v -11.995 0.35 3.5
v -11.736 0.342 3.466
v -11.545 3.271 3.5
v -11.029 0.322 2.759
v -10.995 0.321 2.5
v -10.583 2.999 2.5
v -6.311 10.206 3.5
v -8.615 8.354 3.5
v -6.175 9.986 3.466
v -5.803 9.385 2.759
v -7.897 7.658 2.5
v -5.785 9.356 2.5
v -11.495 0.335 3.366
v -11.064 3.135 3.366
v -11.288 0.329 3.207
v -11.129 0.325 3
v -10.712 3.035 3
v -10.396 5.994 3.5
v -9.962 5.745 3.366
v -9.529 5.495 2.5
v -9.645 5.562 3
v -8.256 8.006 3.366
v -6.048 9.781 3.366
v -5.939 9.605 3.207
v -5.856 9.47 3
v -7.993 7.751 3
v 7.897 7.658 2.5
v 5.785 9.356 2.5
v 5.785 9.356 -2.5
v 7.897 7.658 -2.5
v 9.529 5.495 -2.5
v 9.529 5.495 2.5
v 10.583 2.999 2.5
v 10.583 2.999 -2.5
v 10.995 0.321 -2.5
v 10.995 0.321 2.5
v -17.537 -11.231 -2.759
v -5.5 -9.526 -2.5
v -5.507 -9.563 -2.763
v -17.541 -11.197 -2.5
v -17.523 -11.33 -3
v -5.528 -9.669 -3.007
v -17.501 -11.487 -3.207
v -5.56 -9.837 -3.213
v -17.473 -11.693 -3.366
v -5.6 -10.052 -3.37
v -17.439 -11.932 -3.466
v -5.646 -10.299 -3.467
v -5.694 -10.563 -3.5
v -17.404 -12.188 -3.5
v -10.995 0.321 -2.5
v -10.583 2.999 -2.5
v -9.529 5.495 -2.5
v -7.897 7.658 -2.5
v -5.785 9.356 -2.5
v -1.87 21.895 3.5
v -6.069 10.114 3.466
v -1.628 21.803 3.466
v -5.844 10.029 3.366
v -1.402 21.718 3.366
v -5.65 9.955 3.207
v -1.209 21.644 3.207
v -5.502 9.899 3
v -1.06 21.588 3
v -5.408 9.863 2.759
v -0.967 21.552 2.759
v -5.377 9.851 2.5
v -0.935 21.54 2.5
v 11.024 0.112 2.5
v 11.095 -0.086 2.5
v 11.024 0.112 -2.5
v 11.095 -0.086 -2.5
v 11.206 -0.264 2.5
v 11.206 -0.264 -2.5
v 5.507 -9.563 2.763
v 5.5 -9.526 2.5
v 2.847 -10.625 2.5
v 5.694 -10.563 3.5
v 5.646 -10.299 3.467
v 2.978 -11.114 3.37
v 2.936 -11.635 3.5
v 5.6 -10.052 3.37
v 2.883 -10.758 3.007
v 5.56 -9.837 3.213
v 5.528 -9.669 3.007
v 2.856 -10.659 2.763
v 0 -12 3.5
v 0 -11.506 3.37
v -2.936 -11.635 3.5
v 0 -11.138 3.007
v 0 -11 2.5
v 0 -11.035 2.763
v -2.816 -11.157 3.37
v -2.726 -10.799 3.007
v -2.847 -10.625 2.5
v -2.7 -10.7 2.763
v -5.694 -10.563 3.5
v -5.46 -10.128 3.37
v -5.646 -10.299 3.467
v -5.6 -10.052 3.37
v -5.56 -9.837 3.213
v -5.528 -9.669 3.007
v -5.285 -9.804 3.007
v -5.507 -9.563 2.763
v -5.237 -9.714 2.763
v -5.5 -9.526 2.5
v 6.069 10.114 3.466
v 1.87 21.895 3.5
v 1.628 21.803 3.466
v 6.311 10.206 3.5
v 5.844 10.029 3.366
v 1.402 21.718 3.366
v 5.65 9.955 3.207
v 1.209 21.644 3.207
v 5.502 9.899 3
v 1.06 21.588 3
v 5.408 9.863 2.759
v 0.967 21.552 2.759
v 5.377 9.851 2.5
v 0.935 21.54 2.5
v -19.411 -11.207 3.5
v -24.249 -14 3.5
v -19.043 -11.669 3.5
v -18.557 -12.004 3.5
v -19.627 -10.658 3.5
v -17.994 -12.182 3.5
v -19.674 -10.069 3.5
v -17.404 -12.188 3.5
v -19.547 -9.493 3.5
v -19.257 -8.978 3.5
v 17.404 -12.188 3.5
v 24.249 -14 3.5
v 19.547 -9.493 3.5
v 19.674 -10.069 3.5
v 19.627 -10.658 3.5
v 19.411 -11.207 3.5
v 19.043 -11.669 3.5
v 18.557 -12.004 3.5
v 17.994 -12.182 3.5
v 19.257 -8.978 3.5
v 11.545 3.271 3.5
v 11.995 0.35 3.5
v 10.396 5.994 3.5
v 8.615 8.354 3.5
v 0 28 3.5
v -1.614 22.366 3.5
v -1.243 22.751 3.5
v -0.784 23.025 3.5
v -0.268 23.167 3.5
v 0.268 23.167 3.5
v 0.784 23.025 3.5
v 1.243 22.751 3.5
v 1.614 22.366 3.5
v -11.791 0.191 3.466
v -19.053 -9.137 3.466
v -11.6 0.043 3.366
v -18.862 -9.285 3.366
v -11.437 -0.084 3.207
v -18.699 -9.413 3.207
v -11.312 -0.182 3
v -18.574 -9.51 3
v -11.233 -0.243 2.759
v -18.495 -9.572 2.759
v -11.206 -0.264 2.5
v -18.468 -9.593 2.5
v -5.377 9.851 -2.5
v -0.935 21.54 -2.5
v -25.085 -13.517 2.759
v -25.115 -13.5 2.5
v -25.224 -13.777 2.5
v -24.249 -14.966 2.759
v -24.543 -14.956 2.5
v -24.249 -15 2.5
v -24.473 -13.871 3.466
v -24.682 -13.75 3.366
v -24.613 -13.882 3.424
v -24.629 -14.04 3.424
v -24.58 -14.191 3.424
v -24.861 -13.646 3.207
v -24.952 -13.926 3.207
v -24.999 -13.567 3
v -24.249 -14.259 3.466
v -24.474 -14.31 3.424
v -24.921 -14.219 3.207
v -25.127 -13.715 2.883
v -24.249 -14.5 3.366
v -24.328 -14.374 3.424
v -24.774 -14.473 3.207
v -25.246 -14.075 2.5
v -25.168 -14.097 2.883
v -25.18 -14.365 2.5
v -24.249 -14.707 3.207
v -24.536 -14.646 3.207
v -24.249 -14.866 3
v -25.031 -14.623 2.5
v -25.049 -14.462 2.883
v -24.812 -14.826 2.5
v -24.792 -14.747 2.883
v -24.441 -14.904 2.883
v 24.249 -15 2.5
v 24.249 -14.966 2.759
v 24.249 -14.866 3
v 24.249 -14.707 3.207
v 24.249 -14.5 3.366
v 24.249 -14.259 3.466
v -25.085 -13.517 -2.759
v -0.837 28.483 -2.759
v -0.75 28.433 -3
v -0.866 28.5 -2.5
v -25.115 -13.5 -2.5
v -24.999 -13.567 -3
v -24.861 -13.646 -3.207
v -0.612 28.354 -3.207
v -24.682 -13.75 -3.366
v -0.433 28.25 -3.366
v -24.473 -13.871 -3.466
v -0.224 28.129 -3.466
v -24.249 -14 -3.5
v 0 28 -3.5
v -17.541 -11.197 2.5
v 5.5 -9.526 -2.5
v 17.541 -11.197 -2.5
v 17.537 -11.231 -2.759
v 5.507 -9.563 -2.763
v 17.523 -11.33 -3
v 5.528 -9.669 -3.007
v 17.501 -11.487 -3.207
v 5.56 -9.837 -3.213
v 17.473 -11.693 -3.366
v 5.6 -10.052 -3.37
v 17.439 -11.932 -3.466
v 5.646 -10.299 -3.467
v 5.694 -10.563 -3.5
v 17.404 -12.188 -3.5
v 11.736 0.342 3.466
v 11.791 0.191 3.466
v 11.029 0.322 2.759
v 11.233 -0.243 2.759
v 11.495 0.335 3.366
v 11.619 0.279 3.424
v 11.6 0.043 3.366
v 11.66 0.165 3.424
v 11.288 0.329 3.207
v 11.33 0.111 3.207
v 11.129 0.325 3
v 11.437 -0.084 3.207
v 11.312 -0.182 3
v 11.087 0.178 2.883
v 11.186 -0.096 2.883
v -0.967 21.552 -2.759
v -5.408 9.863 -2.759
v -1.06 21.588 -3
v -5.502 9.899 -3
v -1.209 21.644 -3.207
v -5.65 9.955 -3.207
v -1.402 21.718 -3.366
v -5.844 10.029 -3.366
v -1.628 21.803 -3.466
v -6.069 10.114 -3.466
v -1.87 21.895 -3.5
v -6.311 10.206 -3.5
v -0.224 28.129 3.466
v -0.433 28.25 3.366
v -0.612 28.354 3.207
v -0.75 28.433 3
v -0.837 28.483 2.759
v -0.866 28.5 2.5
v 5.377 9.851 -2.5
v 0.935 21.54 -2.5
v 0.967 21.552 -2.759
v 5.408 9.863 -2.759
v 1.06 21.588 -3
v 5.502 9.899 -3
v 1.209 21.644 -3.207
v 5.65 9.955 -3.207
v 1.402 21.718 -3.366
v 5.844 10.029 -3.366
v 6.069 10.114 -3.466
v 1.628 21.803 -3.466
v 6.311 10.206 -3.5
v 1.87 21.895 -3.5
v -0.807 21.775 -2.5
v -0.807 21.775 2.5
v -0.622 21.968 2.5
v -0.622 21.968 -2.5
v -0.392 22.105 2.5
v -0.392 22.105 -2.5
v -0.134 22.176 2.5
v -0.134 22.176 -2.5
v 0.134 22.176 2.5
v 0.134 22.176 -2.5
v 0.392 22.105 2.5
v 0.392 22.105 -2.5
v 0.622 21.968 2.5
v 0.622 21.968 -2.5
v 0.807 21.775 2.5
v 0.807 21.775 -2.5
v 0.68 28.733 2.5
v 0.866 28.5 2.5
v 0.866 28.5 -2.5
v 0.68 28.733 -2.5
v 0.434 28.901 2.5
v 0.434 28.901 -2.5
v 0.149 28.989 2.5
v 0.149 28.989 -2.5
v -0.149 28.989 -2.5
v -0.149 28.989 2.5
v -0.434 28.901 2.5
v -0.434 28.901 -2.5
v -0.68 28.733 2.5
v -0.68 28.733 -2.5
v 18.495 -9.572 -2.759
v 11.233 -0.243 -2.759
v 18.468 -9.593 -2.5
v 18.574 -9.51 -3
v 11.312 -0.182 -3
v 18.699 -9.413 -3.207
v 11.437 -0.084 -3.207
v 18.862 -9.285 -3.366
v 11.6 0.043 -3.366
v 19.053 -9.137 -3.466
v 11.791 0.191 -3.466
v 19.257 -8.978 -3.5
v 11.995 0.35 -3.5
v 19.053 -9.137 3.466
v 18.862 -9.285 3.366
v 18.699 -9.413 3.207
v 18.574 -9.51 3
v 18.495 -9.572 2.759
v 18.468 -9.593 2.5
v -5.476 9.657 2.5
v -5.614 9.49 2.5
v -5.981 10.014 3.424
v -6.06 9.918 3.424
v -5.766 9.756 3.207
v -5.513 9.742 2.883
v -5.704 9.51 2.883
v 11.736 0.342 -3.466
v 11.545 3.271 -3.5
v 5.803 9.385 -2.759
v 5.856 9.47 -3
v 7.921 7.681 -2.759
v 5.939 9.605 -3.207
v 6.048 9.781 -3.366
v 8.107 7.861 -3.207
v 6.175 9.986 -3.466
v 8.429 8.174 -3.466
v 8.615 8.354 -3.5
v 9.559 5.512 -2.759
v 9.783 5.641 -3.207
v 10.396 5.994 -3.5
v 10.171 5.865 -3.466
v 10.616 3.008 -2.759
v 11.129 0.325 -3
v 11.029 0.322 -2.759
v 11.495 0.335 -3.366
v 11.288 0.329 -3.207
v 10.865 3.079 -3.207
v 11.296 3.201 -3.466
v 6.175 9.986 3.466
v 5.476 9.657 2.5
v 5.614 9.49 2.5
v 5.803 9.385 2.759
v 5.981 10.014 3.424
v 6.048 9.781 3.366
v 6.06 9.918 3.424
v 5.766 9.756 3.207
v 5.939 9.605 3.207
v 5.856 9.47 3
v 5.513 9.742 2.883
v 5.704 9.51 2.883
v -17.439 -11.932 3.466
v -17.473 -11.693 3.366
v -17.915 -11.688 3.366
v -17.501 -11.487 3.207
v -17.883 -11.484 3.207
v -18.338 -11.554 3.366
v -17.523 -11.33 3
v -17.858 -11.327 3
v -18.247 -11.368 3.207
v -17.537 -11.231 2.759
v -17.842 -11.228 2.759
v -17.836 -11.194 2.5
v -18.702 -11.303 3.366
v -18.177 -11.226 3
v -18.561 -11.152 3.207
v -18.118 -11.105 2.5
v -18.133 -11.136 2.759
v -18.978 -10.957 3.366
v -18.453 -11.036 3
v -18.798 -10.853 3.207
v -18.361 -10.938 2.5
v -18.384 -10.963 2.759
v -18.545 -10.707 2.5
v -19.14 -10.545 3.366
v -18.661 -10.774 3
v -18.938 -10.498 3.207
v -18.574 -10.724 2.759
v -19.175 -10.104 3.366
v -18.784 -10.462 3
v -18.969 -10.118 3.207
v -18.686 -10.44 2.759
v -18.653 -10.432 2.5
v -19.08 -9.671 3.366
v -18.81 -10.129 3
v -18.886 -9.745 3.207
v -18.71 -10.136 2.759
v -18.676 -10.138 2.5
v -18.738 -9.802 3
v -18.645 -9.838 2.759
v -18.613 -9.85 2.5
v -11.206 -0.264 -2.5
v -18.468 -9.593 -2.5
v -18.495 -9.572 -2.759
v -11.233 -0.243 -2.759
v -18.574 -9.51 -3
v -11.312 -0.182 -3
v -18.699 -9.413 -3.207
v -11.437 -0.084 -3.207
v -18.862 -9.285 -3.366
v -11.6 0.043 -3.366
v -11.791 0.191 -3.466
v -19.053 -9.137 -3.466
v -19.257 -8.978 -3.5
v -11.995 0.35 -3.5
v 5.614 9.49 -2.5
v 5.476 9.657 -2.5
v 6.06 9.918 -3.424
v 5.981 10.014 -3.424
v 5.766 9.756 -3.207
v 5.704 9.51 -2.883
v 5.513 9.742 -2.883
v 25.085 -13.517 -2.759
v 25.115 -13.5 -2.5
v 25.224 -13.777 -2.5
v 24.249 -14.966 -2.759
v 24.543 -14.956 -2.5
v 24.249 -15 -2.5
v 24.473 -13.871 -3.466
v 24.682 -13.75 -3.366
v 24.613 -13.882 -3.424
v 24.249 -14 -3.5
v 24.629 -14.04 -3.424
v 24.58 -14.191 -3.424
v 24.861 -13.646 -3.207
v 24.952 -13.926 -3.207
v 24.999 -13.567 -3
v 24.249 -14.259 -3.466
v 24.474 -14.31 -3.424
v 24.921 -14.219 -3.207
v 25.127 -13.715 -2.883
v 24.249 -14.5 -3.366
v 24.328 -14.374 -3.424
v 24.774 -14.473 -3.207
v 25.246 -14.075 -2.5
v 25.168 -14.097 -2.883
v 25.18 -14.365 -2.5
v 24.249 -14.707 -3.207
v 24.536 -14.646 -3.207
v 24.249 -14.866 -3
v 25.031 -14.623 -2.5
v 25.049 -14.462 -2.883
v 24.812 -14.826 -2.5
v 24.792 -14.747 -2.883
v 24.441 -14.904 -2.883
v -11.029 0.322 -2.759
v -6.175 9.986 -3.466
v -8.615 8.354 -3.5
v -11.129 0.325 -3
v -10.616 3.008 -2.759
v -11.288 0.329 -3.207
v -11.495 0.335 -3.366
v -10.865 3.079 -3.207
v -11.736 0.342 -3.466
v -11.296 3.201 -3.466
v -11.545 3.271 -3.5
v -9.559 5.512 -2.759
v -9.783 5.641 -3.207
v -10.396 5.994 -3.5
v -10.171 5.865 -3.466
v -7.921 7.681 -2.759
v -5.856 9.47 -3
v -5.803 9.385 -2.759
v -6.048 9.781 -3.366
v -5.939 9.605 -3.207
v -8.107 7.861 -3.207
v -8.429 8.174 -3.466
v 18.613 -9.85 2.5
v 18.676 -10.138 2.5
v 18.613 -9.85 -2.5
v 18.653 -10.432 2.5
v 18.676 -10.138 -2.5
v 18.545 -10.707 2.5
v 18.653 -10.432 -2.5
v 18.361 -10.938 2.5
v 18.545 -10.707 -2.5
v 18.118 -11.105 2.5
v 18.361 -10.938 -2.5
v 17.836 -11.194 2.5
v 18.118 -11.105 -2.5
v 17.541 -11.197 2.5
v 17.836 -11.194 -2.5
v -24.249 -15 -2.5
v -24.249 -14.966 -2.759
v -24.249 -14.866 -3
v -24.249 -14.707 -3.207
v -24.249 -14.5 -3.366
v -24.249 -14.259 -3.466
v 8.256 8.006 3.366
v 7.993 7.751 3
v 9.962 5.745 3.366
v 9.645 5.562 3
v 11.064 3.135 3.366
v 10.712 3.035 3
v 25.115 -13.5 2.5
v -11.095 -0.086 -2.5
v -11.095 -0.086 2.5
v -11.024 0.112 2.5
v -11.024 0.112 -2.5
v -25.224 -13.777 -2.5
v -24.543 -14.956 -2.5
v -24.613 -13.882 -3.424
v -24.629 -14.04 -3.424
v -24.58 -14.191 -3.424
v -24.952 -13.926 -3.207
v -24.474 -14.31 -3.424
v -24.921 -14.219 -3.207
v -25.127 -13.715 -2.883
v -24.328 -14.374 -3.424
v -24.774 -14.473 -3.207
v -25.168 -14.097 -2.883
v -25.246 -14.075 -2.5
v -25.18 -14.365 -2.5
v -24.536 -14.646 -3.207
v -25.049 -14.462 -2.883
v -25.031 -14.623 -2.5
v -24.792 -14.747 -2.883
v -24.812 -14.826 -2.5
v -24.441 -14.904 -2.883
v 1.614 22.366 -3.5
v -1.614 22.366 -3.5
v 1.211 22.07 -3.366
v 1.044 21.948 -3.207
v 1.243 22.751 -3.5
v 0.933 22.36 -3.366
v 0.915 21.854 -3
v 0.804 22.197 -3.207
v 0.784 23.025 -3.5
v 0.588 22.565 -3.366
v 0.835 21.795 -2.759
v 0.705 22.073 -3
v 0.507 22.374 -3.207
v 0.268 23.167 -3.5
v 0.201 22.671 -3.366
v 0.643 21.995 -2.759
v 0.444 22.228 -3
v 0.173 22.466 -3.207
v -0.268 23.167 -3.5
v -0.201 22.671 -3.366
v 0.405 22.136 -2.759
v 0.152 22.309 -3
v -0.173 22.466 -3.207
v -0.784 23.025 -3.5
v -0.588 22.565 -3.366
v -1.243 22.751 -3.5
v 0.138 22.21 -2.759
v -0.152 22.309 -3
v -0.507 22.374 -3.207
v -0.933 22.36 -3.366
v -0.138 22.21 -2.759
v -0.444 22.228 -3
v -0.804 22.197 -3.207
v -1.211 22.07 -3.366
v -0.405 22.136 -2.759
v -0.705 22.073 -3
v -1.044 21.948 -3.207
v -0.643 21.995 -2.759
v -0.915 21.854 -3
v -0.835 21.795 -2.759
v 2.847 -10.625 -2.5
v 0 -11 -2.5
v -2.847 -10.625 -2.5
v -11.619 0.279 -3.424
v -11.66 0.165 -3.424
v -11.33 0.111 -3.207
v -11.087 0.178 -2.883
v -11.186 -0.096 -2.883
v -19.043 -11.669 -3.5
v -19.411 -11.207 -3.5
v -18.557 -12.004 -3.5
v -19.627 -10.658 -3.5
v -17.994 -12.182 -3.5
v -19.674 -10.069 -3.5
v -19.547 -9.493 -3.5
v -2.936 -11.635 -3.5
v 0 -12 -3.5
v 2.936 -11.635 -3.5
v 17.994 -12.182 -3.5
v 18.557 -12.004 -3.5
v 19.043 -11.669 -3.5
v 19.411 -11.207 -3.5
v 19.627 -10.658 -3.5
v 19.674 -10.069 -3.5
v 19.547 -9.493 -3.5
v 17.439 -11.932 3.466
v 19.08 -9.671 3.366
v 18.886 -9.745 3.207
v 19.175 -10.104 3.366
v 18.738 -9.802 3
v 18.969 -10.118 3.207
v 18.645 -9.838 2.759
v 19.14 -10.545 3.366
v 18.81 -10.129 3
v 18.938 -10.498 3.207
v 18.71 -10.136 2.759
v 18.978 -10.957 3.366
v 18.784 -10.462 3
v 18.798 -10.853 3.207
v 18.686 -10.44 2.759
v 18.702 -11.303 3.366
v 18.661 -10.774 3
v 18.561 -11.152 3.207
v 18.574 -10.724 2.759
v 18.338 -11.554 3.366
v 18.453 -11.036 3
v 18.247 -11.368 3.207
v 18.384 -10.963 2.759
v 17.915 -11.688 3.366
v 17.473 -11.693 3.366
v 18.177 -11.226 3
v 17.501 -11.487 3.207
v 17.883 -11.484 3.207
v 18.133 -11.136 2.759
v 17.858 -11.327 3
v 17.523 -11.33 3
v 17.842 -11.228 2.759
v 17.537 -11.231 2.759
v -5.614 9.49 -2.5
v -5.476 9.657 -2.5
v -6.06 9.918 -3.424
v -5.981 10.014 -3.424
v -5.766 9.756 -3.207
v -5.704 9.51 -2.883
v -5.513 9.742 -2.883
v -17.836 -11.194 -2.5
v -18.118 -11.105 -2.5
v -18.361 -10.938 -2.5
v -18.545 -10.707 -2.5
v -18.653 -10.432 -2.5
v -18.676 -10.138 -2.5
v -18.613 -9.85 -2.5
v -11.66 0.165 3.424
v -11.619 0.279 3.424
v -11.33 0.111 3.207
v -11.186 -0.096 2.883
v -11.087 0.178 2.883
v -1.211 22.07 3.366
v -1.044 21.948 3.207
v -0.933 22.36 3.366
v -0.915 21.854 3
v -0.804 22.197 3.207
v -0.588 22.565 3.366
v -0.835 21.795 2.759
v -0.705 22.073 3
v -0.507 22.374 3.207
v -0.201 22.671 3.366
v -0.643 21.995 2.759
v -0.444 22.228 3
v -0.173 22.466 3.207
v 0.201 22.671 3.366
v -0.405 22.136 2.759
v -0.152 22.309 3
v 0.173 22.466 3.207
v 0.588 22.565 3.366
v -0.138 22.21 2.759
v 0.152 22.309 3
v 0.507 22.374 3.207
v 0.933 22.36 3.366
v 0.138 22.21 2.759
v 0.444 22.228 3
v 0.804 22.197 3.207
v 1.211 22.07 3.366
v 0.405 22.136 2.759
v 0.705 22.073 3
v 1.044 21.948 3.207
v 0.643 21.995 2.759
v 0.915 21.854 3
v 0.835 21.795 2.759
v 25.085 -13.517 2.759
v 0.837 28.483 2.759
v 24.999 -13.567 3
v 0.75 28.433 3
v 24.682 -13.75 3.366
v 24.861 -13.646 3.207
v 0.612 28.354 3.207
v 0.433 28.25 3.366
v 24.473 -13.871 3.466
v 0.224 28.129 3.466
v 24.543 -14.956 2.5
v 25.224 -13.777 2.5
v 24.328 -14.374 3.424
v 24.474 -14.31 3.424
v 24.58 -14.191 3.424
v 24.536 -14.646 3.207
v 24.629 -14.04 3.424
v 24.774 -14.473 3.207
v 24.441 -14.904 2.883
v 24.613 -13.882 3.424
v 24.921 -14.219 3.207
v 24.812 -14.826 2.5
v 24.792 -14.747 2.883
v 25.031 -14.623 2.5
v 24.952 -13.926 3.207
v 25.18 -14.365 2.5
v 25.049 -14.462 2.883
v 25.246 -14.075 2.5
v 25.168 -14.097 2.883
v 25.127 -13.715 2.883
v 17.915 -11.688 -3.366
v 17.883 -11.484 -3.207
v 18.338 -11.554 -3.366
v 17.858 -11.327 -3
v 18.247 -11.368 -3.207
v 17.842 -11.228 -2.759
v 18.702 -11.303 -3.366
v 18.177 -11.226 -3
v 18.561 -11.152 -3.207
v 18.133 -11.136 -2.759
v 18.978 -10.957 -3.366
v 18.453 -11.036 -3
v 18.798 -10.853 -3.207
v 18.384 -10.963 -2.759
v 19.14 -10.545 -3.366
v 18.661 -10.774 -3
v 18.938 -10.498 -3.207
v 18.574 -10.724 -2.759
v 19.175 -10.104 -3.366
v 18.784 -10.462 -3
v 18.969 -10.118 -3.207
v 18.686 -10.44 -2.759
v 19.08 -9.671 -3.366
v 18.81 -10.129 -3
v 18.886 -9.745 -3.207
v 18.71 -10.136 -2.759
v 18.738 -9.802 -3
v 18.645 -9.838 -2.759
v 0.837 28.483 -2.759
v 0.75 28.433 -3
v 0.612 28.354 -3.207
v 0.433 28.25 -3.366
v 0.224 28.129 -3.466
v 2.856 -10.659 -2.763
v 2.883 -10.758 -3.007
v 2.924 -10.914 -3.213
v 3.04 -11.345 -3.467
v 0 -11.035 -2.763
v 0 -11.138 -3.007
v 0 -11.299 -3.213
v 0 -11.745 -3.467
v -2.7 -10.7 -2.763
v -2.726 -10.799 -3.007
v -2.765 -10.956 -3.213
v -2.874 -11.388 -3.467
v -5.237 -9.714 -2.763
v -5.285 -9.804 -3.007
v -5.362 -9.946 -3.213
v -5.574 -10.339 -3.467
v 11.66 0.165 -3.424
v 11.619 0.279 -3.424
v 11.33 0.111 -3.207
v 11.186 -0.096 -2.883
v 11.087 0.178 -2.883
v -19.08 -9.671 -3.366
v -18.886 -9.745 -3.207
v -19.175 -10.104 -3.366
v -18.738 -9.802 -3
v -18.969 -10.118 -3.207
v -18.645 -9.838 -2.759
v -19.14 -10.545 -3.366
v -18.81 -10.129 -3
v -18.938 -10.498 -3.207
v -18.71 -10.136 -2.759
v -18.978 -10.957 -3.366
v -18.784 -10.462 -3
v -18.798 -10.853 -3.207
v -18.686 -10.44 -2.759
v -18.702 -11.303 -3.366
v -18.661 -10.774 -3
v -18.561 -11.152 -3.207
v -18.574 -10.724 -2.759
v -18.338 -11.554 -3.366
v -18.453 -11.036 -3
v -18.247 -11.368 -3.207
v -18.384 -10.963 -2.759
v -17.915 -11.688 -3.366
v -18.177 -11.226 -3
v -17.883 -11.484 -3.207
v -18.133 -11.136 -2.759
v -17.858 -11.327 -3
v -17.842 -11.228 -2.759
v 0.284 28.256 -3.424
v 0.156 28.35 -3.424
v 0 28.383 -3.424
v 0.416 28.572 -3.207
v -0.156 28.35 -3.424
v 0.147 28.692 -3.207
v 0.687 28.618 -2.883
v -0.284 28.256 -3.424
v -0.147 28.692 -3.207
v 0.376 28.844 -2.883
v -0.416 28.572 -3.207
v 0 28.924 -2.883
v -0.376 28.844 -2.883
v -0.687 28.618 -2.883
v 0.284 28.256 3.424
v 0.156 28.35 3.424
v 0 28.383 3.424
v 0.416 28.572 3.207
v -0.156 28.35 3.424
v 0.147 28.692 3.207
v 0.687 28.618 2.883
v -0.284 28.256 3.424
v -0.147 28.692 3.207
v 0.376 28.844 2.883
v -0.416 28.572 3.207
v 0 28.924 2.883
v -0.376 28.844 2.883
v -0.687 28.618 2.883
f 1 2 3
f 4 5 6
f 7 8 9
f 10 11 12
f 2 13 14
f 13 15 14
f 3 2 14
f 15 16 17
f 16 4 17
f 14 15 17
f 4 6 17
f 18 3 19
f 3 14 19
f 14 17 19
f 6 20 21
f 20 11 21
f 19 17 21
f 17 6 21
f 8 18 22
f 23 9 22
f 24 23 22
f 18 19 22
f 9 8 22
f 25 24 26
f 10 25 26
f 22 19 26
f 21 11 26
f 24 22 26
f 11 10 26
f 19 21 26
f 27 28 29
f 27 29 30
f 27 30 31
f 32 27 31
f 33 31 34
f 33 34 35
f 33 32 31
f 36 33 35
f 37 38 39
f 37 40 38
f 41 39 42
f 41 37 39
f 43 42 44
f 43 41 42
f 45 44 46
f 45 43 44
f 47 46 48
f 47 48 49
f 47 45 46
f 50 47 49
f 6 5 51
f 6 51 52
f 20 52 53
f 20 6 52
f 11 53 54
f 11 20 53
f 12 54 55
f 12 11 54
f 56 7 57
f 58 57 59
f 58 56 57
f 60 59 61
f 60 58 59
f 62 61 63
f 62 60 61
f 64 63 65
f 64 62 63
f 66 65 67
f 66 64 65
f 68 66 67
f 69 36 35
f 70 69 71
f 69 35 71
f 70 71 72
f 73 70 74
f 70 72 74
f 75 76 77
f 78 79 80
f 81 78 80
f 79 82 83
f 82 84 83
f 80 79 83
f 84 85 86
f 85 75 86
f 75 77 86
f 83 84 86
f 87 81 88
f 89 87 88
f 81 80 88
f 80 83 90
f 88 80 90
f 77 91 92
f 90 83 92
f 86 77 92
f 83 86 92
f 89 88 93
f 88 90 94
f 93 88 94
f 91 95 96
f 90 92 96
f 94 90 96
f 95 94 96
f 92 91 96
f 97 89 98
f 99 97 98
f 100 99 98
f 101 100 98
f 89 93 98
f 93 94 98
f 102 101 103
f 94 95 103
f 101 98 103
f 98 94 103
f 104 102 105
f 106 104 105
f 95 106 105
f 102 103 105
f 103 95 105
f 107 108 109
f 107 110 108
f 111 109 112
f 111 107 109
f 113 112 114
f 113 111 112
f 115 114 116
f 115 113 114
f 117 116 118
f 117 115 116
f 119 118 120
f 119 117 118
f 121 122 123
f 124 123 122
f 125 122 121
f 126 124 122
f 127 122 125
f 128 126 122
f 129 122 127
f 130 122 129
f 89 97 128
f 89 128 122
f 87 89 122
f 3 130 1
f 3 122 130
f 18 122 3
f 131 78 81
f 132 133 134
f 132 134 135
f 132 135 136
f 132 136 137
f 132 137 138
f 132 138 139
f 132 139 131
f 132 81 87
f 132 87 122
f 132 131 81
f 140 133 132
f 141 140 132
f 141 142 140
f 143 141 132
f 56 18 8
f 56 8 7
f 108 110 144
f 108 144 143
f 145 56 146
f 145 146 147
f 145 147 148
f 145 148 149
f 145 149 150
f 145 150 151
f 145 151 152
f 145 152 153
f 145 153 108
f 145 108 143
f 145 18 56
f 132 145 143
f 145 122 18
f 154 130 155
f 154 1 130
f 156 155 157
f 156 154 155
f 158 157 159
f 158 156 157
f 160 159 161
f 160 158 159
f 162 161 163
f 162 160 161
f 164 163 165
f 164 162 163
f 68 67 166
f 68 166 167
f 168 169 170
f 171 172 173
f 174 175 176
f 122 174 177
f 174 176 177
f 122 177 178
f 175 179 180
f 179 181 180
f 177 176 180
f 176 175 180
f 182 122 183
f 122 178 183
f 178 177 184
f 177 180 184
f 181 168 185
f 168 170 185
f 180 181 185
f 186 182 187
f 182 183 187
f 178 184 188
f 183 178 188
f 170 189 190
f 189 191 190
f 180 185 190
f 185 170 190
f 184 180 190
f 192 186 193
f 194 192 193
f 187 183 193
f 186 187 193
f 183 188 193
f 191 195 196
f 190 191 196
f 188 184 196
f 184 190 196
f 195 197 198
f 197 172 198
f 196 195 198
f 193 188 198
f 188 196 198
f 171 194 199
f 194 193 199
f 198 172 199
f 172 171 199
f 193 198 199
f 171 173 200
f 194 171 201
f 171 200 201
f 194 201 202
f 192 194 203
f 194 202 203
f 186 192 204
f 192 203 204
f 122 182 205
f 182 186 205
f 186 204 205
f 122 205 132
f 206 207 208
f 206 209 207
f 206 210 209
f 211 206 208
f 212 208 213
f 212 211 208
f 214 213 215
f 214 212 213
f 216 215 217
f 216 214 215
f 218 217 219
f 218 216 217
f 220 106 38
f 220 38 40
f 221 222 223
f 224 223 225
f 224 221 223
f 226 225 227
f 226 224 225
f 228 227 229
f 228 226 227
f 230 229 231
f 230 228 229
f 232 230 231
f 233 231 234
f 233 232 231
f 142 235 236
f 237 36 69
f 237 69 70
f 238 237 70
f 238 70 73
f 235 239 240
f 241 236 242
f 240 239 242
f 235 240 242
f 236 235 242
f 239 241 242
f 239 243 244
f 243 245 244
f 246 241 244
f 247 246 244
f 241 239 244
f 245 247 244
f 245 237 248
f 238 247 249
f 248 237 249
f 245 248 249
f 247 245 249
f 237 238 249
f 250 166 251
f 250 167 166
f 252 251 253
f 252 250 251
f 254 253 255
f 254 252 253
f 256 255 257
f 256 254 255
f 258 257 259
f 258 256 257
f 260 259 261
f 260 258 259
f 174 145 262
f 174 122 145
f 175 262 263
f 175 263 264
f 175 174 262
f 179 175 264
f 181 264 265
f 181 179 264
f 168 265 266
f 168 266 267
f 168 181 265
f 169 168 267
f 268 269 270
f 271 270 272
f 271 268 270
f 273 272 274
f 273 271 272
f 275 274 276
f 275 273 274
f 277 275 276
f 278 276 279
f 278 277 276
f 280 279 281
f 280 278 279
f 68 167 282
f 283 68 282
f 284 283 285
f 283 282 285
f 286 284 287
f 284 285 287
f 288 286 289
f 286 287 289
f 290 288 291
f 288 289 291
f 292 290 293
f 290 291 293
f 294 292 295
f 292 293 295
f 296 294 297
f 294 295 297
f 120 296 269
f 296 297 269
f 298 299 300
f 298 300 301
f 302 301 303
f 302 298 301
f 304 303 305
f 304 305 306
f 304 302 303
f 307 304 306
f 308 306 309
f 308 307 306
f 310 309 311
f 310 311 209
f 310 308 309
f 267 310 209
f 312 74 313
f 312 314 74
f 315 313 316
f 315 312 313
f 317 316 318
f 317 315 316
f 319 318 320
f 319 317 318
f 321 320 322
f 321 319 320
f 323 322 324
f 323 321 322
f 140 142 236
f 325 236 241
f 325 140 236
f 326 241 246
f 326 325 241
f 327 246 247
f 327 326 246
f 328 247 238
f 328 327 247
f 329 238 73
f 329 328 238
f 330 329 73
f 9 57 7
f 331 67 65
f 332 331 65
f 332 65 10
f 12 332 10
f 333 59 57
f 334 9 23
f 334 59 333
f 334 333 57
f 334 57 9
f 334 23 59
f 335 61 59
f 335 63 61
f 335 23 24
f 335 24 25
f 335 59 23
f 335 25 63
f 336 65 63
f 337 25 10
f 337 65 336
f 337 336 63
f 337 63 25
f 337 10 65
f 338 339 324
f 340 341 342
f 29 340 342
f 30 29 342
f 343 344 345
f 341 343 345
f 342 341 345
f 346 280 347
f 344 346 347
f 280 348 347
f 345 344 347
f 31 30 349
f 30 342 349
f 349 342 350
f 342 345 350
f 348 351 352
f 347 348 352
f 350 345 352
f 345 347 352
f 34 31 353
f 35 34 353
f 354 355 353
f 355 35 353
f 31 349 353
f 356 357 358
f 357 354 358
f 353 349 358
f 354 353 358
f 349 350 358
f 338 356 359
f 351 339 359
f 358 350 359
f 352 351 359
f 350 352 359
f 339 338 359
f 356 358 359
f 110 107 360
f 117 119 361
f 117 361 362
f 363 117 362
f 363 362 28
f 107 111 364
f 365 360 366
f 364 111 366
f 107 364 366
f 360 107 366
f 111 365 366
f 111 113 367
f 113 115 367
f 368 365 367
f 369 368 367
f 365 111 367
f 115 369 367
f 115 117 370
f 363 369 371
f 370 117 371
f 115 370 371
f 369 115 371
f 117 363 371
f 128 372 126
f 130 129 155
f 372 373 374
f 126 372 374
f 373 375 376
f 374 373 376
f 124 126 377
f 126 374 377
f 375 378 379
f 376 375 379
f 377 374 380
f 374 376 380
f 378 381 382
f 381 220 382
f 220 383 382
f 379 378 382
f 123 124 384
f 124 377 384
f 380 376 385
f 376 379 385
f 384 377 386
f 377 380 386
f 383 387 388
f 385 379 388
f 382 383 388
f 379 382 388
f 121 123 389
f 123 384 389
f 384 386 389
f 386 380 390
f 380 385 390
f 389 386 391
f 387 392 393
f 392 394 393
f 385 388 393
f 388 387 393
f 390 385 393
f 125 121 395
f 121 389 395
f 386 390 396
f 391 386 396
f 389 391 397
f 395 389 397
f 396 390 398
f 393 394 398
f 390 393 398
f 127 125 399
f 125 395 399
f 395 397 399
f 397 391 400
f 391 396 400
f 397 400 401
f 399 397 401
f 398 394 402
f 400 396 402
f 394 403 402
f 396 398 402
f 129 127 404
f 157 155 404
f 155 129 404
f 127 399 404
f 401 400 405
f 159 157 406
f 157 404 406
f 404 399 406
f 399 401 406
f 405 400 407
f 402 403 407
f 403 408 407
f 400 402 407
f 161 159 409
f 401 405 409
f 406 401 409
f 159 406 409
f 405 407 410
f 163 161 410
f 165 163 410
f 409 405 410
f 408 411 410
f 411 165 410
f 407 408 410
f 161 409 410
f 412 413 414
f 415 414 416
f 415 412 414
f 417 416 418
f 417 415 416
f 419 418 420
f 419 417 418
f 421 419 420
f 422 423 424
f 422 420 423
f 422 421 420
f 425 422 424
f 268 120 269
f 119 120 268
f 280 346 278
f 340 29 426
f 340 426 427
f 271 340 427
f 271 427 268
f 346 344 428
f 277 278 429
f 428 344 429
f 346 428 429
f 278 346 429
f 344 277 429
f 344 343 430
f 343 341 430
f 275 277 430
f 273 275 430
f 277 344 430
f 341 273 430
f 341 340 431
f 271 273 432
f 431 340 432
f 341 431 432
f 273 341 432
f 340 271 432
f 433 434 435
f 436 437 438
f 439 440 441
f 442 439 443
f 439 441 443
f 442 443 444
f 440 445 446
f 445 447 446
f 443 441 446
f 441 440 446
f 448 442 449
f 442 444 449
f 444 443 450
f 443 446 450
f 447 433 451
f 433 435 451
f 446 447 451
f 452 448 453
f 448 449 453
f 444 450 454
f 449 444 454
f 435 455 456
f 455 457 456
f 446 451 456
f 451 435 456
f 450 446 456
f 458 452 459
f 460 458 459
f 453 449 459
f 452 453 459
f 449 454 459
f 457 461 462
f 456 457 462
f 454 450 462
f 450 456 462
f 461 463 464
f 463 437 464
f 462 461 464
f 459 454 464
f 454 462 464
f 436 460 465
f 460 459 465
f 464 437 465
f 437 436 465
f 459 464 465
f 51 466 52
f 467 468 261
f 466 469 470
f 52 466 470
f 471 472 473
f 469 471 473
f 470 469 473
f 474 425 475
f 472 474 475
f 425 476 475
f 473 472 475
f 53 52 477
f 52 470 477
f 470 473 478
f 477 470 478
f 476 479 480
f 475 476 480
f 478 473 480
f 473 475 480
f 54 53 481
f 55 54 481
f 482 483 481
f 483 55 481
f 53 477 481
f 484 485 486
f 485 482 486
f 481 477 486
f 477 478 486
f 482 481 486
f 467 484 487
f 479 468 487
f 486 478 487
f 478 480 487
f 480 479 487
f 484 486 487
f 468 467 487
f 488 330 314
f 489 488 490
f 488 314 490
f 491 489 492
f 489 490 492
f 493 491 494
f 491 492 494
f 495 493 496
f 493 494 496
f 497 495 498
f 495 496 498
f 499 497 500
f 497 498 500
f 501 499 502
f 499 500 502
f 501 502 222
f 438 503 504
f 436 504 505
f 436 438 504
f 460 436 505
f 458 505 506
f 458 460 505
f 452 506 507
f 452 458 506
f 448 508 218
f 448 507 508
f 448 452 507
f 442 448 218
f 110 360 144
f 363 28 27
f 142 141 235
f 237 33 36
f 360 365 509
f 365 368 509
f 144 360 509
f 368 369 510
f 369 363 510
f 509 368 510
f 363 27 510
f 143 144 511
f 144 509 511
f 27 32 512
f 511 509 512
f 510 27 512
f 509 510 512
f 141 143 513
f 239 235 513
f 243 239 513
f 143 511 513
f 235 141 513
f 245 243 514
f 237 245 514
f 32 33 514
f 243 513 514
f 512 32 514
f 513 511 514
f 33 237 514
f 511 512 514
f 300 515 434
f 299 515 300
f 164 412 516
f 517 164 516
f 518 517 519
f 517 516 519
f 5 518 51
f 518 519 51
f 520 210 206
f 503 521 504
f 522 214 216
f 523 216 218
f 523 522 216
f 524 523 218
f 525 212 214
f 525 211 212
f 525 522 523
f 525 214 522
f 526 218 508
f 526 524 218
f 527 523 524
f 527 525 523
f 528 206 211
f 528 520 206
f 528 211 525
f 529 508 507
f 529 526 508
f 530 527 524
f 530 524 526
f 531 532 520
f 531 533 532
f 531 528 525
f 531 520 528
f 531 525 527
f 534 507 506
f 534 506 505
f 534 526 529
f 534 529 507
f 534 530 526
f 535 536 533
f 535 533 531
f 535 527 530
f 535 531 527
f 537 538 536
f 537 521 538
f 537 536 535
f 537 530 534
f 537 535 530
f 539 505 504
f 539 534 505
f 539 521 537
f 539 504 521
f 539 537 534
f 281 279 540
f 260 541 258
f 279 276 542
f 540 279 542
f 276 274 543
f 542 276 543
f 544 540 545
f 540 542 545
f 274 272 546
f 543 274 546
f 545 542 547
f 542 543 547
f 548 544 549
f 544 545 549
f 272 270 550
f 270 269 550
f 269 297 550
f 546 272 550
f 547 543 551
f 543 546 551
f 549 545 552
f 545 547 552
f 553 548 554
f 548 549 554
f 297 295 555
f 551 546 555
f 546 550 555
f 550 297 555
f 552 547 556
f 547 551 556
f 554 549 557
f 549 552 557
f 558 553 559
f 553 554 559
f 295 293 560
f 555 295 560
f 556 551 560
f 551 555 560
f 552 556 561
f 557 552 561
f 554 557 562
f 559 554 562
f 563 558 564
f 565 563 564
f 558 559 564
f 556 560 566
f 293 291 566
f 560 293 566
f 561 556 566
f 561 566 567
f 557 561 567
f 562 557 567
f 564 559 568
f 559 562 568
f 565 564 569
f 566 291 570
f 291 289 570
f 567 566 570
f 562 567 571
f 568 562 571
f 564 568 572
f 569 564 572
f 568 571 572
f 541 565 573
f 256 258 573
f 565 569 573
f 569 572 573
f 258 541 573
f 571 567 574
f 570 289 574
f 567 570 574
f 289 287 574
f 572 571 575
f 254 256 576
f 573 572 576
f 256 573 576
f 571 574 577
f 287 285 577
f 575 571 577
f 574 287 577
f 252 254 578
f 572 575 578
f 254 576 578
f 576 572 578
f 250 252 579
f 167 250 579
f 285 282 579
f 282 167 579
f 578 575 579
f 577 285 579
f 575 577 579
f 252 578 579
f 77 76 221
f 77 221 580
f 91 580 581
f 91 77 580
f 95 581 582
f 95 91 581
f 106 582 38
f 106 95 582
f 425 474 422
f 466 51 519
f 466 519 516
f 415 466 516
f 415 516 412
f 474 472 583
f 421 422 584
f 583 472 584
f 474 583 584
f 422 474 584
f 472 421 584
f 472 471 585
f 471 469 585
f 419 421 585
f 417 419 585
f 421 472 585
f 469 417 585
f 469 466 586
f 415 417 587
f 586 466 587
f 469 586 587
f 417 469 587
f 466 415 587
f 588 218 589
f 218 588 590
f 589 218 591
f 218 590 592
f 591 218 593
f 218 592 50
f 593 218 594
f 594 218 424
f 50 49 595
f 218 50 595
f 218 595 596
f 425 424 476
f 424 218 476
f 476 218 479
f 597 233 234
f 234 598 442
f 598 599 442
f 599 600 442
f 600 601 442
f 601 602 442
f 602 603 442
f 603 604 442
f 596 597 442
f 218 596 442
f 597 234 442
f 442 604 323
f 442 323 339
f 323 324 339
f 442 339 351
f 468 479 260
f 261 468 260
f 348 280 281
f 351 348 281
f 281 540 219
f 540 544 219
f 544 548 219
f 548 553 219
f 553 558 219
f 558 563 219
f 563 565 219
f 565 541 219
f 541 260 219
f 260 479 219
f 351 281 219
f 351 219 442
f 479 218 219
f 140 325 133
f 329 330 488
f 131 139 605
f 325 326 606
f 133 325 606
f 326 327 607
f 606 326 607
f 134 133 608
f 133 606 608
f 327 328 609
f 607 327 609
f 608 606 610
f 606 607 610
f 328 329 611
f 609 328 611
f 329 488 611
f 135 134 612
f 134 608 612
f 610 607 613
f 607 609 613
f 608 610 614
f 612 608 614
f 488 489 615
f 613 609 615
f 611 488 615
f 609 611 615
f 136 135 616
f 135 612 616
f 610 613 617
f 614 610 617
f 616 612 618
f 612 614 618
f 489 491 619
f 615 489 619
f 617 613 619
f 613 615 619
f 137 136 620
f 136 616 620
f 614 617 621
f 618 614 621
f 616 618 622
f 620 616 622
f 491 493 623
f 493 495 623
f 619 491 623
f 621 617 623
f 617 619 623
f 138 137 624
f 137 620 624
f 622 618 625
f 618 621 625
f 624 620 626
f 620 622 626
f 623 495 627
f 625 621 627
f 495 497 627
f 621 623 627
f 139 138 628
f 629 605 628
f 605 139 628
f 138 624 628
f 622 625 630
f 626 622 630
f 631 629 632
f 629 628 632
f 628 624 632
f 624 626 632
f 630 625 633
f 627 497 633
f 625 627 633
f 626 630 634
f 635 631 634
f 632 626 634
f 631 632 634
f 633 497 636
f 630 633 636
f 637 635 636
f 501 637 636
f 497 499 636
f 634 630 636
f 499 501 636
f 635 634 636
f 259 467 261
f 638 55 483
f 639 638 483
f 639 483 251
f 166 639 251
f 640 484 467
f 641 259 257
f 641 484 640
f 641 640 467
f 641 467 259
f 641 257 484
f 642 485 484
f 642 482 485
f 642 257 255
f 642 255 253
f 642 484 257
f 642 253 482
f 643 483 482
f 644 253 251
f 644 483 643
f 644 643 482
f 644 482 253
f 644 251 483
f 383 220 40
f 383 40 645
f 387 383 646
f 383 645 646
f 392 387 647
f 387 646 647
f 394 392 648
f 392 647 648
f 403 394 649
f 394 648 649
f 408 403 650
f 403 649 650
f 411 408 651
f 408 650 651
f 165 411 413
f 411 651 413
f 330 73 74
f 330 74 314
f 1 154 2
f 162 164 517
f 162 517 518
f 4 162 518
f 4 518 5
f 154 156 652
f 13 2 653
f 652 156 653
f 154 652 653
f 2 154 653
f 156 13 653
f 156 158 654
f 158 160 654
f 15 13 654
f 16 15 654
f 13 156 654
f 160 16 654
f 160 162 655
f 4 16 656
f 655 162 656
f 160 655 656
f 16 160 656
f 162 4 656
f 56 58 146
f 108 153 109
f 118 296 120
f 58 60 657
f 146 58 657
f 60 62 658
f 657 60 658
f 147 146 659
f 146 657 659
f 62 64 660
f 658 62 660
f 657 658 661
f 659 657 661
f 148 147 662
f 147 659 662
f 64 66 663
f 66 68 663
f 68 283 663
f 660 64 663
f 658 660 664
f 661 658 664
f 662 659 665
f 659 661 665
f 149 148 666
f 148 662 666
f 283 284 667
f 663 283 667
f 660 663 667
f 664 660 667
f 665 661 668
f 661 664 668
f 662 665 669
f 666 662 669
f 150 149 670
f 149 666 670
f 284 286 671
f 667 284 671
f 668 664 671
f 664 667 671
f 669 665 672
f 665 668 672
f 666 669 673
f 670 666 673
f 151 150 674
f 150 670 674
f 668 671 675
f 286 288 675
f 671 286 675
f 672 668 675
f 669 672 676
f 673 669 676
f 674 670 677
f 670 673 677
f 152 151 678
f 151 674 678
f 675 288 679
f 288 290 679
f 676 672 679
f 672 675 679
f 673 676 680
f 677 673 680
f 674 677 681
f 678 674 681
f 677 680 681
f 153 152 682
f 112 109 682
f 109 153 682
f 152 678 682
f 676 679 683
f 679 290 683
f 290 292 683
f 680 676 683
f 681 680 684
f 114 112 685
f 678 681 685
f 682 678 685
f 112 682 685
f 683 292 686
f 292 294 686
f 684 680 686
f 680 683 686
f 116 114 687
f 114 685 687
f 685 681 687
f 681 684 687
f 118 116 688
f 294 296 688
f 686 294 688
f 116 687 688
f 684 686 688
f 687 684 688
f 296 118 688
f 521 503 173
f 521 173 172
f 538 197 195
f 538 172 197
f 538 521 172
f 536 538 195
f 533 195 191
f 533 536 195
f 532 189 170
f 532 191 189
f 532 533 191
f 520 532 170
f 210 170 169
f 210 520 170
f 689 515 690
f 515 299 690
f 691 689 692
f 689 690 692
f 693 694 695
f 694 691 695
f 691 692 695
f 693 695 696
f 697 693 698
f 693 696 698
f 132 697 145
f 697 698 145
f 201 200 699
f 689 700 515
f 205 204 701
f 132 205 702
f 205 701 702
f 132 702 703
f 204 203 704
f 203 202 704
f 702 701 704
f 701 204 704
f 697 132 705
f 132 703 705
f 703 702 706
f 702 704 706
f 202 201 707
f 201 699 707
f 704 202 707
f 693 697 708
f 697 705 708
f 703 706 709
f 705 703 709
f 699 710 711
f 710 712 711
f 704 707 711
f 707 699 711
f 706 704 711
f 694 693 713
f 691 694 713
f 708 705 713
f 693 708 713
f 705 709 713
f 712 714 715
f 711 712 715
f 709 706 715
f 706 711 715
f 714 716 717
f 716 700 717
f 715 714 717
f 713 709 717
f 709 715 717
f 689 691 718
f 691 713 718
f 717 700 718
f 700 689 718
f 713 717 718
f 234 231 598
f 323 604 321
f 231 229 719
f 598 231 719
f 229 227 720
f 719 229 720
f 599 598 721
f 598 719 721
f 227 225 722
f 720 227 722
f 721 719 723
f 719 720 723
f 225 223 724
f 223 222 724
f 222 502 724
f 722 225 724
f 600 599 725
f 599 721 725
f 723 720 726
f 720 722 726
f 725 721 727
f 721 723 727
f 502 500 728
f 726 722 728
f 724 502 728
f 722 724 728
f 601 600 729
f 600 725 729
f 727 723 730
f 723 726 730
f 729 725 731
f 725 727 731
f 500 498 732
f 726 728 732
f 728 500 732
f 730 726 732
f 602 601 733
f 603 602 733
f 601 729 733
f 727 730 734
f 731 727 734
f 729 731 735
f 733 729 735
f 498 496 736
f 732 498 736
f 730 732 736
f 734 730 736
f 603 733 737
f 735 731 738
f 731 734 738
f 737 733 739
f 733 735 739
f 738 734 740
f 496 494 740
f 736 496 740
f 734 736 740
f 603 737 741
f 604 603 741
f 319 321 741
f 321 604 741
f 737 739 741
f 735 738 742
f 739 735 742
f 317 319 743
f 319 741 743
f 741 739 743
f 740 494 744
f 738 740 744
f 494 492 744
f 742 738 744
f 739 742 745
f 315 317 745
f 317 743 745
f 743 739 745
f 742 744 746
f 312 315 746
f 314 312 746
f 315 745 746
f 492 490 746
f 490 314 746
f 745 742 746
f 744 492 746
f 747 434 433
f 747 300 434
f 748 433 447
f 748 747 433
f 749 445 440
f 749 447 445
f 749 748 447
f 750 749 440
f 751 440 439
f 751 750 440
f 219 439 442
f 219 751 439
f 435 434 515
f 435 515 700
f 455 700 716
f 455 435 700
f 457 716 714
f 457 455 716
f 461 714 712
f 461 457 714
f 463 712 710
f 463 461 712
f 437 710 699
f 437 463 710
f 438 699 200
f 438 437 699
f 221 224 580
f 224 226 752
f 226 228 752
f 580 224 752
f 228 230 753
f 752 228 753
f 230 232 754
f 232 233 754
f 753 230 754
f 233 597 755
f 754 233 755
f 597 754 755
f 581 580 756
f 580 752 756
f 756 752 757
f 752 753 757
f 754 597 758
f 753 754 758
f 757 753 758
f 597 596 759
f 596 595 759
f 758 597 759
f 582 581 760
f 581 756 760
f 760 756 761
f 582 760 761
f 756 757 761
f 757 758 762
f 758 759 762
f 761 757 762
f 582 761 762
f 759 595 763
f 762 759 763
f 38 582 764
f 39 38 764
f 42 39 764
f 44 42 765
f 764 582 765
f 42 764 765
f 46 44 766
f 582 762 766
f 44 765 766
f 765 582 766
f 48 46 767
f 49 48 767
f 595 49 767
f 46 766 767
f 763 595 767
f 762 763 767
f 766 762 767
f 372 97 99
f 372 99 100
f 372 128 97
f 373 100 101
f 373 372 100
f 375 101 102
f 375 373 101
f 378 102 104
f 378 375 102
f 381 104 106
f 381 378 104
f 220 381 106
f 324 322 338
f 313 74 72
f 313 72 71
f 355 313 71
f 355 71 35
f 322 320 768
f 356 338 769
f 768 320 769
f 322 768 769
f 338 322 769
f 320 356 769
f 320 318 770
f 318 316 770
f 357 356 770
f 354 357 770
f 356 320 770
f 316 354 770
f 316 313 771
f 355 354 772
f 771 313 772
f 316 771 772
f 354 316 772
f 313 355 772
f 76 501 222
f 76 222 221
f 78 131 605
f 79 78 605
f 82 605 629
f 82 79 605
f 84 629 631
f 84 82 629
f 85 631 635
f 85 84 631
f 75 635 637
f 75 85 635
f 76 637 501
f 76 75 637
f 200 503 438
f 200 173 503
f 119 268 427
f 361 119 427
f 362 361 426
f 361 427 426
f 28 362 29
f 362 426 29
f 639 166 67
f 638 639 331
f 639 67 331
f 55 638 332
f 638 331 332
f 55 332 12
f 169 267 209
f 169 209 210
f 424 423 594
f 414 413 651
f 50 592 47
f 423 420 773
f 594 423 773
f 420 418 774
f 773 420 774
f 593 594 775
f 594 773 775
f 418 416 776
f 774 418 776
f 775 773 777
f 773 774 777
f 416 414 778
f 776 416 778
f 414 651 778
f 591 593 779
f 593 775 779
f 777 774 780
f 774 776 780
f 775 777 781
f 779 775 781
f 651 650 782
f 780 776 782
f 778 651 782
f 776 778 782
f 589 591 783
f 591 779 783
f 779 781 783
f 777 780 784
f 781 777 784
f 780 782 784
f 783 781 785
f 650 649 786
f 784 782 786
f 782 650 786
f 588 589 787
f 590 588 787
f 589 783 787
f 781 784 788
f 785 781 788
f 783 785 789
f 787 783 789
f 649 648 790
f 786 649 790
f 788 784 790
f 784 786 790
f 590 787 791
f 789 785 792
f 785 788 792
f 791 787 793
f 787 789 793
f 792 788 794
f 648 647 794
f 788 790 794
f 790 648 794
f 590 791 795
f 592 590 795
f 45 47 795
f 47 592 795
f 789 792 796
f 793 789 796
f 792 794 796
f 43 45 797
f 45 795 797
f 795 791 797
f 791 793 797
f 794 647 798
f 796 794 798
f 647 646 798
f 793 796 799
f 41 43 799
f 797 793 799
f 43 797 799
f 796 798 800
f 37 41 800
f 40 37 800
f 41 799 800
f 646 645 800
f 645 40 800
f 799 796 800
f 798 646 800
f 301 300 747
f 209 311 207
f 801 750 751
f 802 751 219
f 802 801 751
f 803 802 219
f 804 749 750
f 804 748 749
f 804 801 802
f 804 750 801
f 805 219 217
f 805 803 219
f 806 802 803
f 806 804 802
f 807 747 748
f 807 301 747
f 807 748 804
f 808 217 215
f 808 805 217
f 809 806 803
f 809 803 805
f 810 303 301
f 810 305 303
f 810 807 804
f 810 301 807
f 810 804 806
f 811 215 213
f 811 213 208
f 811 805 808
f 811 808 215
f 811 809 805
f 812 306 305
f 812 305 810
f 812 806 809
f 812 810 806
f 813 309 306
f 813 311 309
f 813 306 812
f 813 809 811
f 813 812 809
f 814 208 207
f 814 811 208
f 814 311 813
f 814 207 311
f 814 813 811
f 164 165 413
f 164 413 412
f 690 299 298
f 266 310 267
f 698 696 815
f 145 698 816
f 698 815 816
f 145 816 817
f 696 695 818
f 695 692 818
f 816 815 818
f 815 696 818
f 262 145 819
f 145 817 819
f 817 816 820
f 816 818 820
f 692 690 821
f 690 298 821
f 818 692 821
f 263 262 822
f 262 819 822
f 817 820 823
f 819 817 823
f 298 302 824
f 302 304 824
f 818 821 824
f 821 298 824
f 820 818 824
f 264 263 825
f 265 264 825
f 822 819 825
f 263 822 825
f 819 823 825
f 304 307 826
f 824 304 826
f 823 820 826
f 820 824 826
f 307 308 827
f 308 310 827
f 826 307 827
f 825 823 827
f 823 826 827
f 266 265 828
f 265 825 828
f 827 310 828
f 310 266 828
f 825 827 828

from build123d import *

# Parameters (mm, degrees)
F1_DEPTH = 3.5
F2_R     = 1


with BuildPart() as f1:
    # F0 (on Top) → F1 (new body, symmetric)
    with BuildSketch(Plane.XY):
        Polygon((25.980762, -15), (0, 30), (-25.980762, -15), align=None)
        with BuildLine():
            Line((-5.5, 9.526279), (0, 24))
            Line((0, 24), (5.5, 9.526279))
            ThreePointArc((5.5, 9.526279), (9.526279, 5.5), (11, 0))
            Line((11, 0), (19.980762, -11.535898))
            Line((19.980762, -11.535898), (5.5, -9.526279))
            ThreePointArc((5.5, -9.526279), (0, -11), (-5.5, -9.526279))
            Line((-5.5, -9.526279), (-19.980762, -11.535898))
            Line((-19.980762, -11.535898), (-11, 0))
            ThreePointArc((-11, 0), (-9.526279, 5.5), (-5.5, 9.526279))
        make_face(mode=Mode.SUBTRACT)
    extrude(amount=F1_DEPTH, both=True)

    # F2
    f2_edges = [f1.edges().sort_by_distance(p)[0] for p in [
        (0, -15, -3.5),
        (25.980762, -15, 0),
        (0, -15, 3.5),
        (-25.980762, -15, 0),
        (12.990381, 7.5, 3.5),
        (-12.990381, 7.5, 3.5),
        (-2.75, 16.76314, 3.5),
        (2.75, 16.76314, 3.5),
        (9.526279, 5.5, 3.5),
        (15.490381, -5.767949, 3.5),
        (12.740381, -10.531089, 3.5),
        (0, -11, 3.5),
        (-12.740381, -10.531089, 3.5),
        (-15.490381, -5.767949, 3.5),
        (-9.526279, 5.5, 3.5),
        (-19.980762, -11.535898, 0),
        (-15.490381, -5.767949, -3.5),
        (-11, 0, 0),
        (-2.75, 16.76314, -3.5),
        (0, 24, 0),
        (-5.5, 9.526279, 0),
        (2.75, 16.76314, -3.5),
        (5.5, 9.526279, 0),
        (9.526279, 5.5, -3.5),
        (11, 0, 0),
        (15.490381, -5.767949, -3.5),
        (19.980762, -11.535898, 0),
        (12.990381, 7.5, -3.5),
        (-12.990381, 7.5, -3.5),
        (12.740381, -10.531089, -3.5),
        (0, -11, -3.5),
        (-12.740381, -10.531089, -3.5),
        (-9.526279, 5.5, -3.5),
        (0, 30, 0),
    ]]
    fillet(f2_edges, radius=F2_R)


solid = f1.part
